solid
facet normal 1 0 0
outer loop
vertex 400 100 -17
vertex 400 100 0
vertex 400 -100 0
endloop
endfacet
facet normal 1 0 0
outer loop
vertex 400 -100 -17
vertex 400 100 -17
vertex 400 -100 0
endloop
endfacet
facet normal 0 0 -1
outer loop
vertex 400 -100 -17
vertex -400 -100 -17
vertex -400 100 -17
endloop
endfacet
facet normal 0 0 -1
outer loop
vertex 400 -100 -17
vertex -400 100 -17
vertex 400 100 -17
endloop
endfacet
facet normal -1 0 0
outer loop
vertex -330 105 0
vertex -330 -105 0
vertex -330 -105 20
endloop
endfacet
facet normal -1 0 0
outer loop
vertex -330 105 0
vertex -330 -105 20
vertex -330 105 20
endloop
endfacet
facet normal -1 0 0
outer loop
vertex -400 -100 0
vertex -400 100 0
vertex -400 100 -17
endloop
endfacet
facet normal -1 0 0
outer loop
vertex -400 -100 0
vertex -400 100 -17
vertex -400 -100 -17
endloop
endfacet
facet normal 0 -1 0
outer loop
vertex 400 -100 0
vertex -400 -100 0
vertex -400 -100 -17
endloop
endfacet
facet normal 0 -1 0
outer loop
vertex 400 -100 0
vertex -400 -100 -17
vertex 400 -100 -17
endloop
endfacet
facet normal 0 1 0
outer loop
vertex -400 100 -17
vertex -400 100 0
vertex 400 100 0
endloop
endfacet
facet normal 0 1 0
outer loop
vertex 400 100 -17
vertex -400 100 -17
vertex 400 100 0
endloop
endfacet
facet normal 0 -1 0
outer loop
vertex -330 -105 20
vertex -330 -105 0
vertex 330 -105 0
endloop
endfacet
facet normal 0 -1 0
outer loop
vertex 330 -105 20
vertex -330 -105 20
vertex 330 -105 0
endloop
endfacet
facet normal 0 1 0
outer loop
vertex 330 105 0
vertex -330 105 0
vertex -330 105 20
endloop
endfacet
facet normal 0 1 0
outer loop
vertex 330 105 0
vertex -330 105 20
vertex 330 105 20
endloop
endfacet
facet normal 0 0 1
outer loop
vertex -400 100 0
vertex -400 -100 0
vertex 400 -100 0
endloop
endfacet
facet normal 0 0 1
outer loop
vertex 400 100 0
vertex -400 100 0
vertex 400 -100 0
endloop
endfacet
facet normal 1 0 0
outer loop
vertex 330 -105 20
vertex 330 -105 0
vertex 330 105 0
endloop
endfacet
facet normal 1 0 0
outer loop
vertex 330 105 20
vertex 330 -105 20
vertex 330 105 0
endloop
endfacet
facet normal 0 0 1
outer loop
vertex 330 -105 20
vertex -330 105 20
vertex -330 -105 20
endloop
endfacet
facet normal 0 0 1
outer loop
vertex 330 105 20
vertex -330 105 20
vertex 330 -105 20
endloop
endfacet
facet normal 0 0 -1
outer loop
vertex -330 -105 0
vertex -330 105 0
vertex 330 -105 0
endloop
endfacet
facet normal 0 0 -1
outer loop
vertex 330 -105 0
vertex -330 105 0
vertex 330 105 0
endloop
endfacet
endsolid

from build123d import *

# Parameters (mm, degrees)
F0_W     = 660
F0_H     = 210
F1_DEPTH = 20
F2_W     = 800
F2_H     = 200
F3_DEPTH = 17


with BuildPart() as f1:
    # F0 (on Top) → F1 (new body)
    with BuildSketch(Plane.XY):
        Rectangle(F0_W, F0_H)
    extrude(amount=F1_DEPTH)


with BuildPart() as f3:
    # F2 (on face) → F3 (new body)
    with BuildSketch(Plane(origin=(0, 0, 0), x_dir=(1, 0, 0), z_dir=(0, 0, -1))):
        Rectangle(F2_W, F2_H)
    extrude(amount=F3_DEPTH)


solid = Compound([f1.part, f3.part])
